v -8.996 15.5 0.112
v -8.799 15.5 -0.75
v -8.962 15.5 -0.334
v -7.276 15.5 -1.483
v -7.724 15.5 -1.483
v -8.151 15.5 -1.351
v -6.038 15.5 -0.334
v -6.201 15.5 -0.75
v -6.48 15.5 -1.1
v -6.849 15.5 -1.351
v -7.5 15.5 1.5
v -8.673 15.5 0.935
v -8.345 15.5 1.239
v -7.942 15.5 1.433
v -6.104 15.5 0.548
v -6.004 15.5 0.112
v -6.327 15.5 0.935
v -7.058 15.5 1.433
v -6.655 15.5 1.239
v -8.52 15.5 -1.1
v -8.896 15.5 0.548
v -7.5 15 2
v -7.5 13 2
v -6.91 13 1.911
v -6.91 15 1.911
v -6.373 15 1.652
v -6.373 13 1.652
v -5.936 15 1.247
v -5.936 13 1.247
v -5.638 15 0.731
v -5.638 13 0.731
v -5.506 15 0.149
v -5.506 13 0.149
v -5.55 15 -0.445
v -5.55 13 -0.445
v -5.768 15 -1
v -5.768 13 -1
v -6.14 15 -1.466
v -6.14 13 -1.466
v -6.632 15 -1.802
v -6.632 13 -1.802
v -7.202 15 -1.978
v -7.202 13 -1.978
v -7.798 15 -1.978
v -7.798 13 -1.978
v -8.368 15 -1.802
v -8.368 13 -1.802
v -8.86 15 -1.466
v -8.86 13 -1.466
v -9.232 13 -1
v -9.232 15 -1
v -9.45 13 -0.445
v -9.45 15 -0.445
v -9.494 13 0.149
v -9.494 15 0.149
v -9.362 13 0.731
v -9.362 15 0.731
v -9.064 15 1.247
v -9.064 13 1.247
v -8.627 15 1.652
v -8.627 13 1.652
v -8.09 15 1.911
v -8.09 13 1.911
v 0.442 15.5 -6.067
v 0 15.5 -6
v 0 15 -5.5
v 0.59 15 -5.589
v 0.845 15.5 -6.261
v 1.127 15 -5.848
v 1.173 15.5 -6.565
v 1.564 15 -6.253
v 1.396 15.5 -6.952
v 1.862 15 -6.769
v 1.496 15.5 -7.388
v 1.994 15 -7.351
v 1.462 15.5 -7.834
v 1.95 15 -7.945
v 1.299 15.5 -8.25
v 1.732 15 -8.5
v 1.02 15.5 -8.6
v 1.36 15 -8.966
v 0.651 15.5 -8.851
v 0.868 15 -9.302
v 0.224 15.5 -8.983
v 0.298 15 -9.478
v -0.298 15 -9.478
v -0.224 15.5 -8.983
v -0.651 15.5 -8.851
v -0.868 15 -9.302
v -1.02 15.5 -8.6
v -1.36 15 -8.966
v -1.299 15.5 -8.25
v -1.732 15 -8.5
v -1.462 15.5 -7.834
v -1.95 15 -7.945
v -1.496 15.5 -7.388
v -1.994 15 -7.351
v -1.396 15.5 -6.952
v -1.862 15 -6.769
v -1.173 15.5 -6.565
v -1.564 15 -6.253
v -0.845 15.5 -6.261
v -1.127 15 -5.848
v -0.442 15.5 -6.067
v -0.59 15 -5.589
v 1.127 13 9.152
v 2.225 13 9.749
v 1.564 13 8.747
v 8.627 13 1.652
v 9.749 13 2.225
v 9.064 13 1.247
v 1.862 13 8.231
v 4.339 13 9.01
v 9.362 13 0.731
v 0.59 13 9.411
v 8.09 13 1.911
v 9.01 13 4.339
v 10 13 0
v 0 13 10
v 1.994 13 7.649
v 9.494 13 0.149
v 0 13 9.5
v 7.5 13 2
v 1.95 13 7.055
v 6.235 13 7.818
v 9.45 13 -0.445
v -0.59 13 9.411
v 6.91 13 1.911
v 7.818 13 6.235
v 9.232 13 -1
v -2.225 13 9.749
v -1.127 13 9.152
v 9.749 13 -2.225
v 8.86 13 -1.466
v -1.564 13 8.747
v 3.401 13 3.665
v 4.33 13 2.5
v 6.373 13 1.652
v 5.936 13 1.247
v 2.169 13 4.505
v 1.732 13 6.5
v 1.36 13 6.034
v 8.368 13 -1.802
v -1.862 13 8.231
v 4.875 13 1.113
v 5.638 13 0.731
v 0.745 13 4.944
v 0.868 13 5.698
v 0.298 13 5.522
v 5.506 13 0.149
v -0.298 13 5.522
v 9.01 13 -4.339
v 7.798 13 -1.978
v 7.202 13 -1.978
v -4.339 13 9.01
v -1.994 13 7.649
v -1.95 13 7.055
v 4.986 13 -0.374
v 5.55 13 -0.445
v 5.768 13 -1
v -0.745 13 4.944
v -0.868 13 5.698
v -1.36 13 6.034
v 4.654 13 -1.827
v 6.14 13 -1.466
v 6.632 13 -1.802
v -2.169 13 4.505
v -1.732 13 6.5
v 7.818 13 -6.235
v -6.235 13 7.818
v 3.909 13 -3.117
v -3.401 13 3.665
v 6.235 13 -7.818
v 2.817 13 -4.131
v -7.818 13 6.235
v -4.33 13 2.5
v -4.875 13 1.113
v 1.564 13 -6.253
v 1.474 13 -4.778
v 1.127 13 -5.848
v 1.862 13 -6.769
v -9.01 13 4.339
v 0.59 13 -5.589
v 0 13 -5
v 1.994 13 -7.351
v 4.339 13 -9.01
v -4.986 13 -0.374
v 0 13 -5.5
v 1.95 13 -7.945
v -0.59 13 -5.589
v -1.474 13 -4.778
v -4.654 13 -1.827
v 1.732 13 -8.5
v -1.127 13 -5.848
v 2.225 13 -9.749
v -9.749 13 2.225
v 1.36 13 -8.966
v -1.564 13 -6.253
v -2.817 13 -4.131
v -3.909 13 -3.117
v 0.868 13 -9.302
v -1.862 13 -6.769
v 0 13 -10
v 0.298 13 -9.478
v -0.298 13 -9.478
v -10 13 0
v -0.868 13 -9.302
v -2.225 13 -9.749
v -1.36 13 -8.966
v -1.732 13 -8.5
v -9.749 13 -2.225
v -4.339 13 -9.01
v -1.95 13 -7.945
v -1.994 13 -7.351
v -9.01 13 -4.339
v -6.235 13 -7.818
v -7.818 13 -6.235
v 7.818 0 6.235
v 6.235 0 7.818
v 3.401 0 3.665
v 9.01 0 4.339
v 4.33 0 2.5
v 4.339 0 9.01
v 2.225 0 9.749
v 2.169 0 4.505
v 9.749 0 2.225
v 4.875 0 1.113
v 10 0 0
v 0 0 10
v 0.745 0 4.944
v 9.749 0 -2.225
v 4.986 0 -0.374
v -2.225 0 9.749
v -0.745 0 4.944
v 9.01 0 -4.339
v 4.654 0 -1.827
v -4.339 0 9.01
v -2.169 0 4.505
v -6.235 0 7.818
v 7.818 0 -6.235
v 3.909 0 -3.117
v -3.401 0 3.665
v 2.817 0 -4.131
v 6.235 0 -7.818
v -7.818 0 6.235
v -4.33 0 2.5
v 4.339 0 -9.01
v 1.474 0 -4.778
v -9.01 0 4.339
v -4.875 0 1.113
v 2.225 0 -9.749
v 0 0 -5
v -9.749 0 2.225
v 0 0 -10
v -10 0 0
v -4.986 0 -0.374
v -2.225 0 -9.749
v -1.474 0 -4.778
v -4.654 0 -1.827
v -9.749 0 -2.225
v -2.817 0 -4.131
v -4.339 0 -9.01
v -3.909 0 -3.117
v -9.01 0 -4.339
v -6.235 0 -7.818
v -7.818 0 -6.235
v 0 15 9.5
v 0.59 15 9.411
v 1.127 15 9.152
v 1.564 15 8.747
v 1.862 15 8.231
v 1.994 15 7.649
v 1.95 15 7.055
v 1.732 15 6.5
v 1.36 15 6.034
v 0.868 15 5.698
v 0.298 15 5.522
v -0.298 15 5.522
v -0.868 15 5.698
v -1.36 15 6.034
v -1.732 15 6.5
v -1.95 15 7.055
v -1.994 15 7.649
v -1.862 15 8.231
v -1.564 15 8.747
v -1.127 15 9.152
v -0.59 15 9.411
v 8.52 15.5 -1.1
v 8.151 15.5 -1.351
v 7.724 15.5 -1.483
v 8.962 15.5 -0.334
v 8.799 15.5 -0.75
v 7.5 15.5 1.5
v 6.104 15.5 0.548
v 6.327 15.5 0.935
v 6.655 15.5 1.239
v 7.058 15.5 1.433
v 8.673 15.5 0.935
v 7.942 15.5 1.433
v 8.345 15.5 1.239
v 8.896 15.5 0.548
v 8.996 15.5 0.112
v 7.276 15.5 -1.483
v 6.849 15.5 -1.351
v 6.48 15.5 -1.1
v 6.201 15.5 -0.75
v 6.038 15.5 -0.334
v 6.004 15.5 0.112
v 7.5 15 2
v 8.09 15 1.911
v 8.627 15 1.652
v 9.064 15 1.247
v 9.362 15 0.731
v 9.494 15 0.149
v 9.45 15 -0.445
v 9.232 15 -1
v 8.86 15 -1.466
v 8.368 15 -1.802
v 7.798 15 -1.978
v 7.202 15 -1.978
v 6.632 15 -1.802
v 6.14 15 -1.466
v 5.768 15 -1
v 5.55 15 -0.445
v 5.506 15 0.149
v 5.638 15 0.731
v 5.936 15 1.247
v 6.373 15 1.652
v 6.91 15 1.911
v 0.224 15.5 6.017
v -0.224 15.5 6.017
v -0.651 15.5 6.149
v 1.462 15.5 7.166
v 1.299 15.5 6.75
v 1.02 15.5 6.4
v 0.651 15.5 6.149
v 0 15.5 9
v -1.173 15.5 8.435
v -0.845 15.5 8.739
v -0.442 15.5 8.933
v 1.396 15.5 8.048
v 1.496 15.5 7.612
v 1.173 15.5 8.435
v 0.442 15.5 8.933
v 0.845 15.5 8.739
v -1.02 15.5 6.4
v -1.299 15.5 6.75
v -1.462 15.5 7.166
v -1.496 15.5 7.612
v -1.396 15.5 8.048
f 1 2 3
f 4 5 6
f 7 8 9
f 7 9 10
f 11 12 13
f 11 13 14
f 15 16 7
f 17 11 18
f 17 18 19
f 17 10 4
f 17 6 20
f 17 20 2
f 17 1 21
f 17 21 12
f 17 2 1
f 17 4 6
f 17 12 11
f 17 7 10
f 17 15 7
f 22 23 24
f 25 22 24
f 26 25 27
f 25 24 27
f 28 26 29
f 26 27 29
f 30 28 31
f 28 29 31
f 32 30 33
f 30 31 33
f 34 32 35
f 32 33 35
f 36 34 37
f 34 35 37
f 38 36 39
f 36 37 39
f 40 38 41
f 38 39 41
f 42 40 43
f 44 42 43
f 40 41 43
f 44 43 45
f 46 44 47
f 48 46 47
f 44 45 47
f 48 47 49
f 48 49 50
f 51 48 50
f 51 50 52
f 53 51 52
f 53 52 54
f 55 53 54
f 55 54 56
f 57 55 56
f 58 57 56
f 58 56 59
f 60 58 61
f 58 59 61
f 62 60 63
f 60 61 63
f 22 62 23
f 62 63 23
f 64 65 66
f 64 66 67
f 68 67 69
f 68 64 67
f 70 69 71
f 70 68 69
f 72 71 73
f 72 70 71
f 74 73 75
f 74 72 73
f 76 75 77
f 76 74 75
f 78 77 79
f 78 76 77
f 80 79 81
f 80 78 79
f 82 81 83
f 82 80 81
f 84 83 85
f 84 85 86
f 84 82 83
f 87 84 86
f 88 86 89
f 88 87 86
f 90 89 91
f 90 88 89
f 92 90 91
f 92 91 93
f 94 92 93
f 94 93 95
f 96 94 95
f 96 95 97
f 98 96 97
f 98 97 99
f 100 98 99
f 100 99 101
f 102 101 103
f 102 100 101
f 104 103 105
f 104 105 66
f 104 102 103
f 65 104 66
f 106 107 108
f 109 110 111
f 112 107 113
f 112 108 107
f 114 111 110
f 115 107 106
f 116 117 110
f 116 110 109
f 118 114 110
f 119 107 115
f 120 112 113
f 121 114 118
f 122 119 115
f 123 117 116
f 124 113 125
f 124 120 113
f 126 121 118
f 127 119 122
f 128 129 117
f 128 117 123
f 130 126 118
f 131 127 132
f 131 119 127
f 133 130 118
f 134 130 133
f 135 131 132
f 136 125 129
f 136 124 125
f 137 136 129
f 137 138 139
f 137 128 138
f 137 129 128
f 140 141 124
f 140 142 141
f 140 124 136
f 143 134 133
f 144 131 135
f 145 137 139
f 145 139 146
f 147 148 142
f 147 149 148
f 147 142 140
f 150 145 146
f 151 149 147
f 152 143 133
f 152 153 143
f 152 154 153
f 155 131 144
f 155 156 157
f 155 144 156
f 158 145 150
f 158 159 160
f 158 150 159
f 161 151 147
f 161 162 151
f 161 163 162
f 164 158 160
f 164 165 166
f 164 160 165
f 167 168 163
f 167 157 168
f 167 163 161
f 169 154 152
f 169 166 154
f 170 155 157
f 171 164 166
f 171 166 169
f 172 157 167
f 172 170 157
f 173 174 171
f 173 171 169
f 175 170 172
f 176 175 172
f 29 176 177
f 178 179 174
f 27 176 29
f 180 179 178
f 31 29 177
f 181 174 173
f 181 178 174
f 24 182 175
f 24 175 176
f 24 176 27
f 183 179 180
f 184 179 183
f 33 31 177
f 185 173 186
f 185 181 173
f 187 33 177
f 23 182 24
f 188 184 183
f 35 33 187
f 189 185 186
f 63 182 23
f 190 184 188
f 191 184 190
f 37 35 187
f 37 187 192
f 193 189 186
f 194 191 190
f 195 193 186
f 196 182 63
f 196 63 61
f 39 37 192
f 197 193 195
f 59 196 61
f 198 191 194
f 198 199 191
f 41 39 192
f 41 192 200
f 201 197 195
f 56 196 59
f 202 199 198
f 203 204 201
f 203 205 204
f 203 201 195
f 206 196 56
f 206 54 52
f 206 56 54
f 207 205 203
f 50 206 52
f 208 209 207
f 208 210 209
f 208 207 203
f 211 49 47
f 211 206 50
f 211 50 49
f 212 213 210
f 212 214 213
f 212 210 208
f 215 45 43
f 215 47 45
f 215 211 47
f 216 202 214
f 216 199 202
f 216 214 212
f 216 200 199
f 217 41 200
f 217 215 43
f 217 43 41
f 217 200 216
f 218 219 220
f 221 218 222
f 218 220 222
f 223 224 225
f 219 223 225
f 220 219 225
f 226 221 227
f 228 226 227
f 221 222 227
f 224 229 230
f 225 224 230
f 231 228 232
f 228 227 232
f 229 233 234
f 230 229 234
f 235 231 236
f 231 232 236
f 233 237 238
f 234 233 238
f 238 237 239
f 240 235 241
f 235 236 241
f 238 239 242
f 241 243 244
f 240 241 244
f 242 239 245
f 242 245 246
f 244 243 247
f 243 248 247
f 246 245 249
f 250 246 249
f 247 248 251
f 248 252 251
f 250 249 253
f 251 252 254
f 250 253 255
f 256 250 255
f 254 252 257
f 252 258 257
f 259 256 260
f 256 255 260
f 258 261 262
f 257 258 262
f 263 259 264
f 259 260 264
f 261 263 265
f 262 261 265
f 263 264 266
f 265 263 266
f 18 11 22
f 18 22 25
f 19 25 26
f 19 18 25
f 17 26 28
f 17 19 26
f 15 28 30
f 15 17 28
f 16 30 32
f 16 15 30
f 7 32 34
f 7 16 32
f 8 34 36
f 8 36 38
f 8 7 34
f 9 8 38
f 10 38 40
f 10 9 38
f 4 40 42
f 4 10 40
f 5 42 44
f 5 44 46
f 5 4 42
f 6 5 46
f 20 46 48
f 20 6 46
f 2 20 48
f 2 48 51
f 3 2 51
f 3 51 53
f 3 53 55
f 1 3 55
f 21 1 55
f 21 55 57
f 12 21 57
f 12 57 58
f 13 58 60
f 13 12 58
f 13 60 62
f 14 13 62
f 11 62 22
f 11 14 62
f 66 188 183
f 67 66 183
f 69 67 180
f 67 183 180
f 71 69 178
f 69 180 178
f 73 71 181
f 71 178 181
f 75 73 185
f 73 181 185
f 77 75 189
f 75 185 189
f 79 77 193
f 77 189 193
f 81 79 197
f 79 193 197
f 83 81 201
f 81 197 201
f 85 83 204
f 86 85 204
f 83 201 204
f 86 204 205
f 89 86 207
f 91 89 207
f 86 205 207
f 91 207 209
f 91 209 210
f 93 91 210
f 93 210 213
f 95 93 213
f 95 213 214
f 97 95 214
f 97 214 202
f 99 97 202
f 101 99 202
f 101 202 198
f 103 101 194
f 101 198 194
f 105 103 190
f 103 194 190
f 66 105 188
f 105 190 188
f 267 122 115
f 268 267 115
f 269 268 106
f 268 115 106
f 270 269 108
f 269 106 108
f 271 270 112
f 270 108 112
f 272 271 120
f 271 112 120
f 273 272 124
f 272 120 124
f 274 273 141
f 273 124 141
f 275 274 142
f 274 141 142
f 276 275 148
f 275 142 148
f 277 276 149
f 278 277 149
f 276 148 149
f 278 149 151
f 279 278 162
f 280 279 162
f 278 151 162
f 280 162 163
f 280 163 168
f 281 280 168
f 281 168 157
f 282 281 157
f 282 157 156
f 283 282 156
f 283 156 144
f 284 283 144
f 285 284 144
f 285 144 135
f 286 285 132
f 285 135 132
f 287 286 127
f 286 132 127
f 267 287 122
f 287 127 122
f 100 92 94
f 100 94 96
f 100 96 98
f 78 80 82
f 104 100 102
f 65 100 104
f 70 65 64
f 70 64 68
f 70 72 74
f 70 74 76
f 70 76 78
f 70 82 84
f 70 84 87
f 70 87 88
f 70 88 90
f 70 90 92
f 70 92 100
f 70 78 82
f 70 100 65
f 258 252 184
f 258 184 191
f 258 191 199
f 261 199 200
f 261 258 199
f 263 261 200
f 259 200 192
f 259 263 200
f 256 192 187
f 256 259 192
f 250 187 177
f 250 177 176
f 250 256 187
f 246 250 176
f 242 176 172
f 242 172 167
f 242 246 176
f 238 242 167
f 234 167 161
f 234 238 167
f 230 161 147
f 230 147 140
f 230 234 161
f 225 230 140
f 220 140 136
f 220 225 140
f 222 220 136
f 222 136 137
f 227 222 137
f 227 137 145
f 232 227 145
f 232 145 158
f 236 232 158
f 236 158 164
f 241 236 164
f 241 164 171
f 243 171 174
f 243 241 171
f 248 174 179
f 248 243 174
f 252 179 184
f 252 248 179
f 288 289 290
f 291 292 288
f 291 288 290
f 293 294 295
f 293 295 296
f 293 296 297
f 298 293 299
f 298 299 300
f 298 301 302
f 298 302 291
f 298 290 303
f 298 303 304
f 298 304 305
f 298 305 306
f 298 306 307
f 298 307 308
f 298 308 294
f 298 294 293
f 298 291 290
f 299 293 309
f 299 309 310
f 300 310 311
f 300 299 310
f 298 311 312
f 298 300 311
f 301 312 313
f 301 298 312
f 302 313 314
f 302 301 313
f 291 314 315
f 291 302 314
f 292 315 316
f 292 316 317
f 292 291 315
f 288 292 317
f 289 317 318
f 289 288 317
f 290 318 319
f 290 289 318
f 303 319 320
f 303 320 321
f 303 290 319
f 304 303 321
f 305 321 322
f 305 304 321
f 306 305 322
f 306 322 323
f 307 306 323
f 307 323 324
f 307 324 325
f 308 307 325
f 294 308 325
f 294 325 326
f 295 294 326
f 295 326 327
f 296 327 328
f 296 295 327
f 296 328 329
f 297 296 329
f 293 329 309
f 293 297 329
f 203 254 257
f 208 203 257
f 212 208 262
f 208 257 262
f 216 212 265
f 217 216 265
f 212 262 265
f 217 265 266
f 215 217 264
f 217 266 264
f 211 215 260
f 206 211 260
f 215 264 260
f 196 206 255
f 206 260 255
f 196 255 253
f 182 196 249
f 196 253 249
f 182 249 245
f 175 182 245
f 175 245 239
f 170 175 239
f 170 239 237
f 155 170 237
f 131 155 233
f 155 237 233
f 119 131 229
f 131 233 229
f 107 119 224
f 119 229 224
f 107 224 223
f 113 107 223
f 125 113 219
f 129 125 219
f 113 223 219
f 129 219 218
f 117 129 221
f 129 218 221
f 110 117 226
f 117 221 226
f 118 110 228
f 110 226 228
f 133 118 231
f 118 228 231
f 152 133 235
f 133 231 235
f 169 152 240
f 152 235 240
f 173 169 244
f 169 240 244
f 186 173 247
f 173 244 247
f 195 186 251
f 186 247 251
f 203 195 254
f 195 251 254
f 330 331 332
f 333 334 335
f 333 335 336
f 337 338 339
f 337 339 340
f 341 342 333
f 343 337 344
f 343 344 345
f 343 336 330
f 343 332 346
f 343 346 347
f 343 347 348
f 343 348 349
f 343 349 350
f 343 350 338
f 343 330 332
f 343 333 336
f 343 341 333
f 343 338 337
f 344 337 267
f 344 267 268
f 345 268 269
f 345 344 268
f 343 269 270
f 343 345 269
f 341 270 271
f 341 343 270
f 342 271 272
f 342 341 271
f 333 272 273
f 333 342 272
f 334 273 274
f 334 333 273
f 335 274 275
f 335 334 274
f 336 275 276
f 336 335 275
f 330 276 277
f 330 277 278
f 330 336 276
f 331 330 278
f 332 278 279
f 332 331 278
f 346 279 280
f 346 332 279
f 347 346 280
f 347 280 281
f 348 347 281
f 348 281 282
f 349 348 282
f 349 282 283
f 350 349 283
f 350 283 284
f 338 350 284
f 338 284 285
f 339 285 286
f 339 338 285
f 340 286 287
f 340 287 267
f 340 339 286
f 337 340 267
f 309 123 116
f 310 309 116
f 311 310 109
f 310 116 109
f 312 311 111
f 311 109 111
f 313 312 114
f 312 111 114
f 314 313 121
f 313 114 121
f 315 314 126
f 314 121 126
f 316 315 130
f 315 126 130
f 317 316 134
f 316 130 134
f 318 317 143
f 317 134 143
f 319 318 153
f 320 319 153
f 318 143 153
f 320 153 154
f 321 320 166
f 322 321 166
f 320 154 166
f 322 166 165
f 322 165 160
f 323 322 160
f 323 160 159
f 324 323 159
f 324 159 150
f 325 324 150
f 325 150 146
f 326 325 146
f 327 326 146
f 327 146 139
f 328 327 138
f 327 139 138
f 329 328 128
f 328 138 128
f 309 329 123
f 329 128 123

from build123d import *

# Parameters (mm, degrees)
SKETCH_1_R      = 10
SKETCH_1_R_2    = 5
EXTRUDE_1_DEPTH = 13
SKETCH_2_R      = 2
EXTRUDE_2_DEPTH = 2.5
CHAMFER_1_SIZE  = 0.5


with BuildPart() as part:
    # 草图1 → 凸台-拉伸1 (new body)
    with BuildSketch(Plane(origin=(0, 0, 0), x_dir=(1, 0, 0), z_dir=(0, 1, 0))):
        with Locations(Location((0, 0, 0), (0, 0, 90))):
            Circle(SKETCH_1_R)
        with Locations(Location((0, 0, 0), (0, 0, 90))):
            Circle(SKETCH_1_R_2, mode=Mode.SUBTRACT)
    extrude(amount=EXTRUDE_1_DEPTH)

    # 草图2 → 凸台-拉伸2 (add)
    with BuildSketch(Plane(origin=(0, 13, 0), x_dir=(1, 0, 0), z_dir=(0, 1, 0))):
        with Locations(Location((0, 7.5, 0), (0, 0, 270))):
            Circle(SKETCH_2_R)
        with Locations(Location((7.5, 0, 0), (0, 0, 270))):
            Circle(SKETCH_2_R)
        with Locations(Location((0, -7.5, 0), (0, 0, 270))):
            Circle(SKETCH_2_R)
        with Locations(Location((-7.5, 0, 0), (0, 0, 270))):
            Circle(SKETCH_2_R)
    extrude(amount=EXTRUDE_2_DEPTH)

    # 倒角1
    chamfer_1_edges = [part.edges().sort_by_distance(p)[0] for p in [
        (0, 15.5, -9.5),
        (7.5, 15.5, -2),
        (0, 15.5, 5.5),
        (-7.5, 15.5, -2),
    ]]
    chamfer(chamfer_1_edges, length=CHAMFER_1_SIZE)


solid = part.part
